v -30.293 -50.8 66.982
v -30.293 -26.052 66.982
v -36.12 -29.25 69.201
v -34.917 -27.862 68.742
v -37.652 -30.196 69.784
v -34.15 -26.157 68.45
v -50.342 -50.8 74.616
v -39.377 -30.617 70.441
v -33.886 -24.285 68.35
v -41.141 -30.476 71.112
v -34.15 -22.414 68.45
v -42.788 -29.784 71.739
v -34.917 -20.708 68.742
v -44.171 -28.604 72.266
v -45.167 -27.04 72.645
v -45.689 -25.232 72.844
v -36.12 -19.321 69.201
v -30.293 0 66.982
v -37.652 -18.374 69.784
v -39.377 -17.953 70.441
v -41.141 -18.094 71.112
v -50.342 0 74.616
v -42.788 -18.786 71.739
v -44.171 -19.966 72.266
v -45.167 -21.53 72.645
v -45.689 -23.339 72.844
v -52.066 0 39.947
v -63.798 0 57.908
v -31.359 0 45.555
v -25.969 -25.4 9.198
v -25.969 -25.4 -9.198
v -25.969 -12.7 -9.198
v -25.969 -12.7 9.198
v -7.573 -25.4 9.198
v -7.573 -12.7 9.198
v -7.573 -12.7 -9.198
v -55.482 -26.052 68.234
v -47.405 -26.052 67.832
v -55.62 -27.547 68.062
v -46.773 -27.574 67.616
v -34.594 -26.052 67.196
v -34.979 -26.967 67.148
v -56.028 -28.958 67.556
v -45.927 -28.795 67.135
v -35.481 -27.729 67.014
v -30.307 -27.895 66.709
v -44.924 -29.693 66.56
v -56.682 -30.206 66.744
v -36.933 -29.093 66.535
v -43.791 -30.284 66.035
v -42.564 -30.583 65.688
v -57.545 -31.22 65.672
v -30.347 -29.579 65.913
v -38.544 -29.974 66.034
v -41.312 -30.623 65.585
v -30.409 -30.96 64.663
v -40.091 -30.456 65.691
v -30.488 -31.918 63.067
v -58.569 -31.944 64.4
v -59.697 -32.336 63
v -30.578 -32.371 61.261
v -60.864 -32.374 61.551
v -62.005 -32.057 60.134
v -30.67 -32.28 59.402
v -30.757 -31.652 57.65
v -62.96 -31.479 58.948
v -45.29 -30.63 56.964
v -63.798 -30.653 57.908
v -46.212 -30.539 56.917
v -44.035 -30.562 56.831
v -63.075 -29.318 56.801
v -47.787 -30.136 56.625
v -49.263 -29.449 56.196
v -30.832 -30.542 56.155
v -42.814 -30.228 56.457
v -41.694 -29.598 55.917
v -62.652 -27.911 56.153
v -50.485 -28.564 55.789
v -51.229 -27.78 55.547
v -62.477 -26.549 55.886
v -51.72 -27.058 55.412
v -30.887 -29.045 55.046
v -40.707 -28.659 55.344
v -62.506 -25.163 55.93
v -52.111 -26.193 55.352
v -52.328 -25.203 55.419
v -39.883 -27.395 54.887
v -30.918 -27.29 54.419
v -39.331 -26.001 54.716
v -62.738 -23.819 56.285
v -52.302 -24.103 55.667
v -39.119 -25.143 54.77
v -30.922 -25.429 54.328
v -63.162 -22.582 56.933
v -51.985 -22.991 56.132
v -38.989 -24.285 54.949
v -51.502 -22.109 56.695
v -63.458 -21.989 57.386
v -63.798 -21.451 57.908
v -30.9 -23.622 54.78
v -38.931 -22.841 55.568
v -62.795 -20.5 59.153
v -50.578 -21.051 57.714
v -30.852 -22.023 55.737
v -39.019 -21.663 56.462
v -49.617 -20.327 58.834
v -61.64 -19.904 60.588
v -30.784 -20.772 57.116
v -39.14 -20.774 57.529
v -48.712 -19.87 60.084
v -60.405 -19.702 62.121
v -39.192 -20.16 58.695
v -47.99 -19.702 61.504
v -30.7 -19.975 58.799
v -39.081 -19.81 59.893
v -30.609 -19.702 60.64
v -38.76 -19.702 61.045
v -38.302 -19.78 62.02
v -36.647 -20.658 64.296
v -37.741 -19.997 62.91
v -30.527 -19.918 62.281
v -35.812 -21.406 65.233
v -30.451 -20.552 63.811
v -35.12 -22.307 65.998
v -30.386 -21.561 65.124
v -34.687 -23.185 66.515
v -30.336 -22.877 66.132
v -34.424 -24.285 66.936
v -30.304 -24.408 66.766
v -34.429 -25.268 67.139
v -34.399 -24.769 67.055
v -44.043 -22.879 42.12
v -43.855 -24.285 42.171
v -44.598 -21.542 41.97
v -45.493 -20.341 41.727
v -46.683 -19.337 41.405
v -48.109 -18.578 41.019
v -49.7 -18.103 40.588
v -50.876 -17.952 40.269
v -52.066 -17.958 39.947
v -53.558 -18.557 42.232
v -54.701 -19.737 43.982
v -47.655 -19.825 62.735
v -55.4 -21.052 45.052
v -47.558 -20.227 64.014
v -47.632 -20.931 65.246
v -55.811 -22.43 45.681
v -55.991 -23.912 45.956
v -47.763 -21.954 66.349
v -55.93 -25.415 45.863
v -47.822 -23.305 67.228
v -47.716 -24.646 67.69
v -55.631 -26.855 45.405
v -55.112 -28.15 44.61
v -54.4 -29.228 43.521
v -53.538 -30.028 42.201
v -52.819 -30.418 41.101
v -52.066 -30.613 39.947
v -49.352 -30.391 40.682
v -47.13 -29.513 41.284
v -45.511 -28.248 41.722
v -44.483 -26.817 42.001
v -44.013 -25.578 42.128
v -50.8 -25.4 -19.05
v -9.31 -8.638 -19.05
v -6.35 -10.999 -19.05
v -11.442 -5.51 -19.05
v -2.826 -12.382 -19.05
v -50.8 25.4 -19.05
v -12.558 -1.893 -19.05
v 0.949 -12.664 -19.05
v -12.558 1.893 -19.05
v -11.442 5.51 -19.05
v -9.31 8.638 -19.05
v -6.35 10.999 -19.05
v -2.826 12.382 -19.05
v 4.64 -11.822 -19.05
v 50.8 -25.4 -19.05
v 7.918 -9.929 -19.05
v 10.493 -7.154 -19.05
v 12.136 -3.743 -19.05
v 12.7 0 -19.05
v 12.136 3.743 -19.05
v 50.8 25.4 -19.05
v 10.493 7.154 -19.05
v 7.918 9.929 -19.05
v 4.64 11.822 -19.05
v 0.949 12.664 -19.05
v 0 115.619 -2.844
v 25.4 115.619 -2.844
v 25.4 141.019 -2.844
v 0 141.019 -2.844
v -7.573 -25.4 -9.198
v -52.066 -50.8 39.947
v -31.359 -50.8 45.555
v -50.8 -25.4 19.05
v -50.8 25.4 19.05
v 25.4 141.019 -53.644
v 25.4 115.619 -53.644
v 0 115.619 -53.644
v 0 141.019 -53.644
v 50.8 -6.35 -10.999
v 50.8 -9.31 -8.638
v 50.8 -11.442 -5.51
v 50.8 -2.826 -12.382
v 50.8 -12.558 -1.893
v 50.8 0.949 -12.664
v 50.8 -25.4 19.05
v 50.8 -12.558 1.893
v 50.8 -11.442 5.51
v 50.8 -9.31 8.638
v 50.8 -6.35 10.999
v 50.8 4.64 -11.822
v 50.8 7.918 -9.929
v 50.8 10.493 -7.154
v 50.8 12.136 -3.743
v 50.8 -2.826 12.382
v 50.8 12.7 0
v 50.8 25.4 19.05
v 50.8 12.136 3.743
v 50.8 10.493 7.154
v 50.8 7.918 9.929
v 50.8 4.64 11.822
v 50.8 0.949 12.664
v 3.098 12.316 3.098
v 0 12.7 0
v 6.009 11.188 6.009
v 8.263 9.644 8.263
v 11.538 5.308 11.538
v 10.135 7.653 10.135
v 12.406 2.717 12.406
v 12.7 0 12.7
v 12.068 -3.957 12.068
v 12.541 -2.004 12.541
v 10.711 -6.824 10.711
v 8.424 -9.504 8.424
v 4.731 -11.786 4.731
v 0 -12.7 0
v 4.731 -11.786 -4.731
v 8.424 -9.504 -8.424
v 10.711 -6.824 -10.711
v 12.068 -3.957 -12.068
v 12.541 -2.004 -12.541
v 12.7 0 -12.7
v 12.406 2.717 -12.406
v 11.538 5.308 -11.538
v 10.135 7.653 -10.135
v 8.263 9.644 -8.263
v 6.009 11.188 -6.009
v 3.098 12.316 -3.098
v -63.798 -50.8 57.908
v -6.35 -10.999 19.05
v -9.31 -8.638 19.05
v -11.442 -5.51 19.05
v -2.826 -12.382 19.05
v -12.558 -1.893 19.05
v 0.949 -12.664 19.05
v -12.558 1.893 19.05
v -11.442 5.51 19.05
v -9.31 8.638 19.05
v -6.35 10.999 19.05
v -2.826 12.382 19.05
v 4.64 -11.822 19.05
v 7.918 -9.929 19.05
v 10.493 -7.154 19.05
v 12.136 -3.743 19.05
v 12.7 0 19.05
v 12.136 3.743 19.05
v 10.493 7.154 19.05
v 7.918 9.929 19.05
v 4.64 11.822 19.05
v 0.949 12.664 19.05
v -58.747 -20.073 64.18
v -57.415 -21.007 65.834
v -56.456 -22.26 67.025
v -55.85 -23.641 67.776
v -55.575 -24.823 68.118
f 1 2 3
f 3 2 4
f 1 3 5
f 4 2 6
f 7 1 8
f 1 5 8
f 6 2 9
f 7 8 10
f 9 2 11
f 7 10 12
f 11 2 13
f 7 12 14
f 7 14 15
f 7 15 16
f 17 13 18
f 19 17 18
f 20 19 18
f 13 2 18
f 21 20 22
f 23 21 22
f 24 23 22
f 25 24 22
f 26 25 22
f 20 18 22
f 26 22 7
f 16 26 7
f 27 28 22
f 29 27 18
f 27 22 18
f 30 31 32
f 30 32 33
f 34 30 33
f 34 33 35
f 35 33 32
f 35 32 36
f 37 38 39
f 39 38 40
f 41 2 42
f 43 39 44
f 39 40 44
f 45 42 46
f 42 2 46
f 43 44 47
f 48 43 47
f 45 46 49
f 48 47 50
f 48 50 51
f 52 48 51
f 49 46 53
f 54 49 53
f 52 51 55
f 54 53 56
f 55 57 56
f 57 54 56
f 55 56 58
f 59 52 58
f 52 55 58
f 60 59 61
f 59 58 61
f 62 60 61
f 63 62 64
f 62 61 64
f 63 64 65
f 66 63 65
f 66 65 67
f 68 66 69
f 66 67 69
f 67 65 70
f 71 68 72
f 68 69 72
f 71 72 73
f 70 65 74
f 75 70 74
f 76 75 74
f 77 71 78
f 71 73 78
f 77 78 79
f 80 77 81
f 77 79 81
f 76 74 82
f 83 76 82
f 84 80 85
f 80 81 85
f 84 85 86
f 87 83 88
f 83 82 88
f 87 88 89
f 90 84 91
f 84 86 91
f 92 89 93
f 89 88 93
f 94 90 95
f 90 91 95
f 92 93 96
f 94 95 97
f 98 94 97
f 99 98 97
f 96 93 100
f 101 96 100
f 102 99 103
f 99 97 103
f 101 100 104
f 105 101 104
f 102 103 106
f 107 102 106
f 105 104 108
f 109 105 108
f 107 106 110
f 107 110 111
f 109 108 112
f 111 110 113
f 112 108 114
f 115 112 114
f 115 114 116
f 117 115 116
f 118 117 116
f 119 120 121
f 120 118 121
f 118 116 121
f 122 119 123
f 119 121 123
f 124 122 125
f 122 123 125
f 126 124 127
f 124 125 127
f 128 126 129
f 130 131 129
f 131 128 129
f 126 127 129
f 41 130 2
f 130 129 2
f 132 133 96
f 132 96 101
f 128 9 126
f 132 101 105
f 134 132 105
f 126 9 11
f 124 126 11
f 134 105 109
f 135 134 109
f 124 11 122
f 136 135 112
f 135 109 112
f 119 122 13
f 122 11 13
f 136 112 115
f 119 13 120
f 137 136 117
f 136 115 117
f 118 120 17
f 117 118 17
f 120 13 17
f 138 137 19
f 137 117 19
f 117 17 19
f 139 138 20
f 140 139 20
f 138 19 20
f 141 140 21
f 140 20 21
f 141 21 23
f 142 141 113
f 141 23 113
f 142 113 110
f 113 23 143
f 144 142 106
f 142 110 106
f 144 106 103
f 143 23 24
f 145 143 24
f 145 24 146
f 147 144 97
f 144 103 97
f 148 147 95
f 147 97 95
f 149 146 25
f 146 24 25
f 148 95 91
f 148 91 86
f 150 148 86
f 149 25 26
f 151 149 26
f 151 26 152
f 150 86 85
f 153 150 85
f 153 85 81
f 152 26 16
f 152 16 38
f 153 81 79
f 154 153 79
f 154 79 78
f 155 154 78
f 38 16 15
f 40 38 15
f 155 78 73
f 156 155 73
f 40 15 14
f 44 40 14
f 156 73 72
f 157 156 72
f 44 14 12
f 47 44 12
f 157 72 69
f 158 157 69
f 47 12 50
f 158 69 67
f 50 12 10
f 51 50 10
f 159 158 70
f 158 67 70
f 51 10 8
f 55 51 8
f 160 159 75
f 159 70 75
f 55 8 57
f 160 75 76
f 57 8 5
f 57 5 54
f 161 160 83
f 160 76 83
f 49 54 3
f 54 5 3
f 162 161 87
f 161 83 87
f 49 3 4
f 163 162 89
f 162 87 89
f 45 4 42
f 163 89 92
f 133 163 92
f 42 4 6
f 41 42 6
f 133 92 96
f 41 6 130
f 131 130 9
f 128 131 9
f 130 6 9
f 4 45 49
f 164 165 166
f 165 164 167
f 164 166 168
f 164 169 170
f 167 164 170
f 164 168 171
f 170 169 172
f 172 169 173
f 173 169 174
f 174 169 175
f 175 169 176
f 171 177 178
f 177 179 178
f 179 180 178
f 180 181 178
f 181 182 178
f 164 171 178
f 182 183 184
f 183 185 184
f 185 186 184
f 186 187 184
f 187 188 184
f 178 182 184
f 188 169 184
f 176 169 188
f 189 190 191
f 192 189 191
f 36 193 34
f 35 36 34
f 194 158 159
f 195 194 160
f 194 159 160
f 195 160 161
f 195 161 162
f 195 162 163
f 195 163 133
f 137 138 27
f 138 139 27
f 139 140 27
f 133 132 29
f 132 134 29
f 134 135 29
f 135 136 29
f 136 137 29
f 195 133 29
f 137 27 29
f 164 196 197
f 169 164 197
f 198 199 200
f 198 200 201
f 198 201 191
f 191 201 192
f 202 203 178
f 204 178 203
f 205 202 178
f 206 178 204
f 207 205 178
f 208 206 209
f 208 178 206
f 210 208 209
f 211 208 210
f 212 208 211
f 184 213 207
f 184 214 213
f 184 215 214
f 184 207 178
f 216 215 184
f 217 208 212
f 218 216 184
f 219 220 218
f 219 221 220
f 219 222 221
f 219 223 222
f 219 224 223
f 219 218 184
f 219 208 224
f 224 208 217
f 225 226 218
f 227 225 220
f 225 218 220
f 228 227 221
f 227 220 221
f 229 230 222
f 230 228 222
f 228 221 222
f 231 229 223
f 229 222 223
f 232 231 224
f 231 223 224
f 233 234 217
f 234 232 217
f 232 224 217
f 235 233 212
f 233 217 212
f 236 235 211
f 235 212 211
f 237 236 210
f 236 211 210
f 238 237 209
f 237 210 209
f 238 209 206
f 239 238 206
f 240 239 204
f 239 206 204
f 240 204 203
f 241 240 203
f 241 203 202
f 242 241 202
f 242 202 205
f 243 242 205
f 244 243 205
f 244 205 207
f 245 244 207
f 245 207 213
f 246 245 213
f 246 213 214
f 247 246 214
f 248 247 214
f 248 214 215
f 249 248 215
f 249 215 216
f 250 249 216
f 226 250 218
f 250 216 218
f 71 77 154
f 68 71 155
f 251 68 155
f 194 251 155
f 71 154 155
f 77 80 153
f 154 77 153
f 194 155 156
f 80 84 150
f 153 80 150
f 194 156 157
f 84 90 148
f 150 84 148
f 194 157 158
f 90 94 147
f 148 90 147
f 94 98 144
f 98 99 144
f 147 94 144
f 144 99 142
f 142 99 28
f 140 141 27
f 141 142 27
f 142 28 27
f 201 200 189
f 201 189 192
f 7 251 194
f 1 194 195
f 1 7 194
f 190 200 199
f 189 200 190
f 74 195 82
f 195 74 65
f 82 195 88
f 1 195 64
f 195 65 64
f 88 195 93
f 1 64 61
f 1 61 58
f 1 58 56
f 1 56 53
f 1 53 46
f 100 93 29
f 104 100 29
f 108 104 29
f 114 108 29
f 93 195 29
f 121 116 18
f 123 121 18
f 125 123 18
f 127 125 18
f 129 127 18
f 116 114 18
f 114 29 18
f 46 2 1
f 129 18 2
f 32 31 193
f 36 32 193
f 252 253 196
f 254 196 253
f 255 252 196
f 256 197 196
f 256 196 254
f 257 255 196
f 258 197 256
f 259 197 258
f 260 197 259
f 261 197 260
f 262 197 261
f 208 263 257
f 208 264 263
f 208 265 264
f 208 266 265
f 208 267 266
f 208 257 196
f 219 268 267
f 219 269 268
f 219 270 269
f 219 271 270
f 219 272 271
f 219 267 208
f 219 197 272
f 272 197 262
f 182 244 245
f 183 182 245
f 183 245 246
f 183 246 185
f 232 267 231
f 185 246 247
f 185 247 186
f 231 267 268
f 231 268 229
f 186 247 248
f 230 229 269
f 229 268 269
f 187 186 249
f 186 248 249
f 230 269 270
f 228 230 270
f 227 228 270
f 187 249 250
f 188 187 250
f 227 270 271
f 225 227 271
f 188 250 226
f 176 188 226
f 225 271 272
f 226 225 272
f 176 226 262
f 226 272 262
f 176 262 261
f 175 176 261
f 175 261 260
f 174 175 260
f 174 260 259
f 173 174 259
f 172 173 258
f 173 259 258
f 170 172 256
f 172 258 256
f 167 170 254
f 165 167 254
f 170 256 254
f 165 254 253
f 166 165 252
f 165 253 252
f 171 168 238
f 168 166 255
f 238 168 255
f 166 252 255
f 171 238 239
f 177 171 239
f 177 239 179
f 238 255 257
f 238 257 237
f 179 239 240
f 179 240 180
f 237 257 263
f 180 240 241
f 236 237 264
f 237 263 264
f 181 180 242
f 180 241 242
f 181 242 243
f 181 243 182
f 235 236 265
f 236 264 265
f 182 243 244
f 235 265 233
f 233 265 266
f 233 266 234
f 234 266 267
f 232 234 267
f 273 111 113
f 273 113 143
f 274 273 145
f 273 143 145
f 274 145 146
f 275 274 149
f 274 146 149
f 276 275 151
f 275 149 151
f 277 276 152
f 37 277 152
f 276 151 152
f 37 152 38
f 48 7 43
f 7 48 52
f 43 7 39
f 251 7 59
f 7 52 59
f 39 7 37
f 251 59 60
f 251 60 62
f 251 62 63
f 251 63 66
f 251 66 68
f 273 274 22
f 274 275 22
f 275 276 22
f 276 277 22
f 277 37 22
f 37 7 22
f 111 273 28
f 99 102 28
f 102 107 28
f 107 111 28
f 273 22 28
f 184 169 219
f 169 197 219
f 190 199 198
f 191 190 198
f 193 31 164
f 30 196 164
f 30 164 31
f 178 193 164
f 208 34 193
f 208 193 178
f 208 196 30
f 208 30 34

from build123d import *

# Parameters (mm, degrees)
F0_W      = 101.6
F0_H      = 50.8
F1_DEPTH  = 19.05
F2_R      = 12.7
F3_DEPTH  = 38.101
F4_R      = 12.7
F5_DEPTH  = 50.8
F7_DEPTH  = 50.8
F8_R      = 6.35
F9_DEPTH  = 92.3240785944
F11_DEPTH = 33.8433961016
F12_W     = 18.3963073453
F12_H     = 18.3963073453
F13_DEPTH = 12.7
F14_W     = 25.4
F14_H     = 50.8
F15_DEPTH = 25.4


with BuildPart() as f1:
    # F0 (on Top) → F1 (new body, symmetric)
    with BuildSketch(Plane.XY):
        Rectangle(F0_W, F0_H)
    extrude(amount=F1_DEPTH, both=True)

    # F2 (on face) → F3 (cut, through all)
    with BuildSketch(Plane.XY.offset(19.05)):
        Circle(F2_R)
    extrude(amount=-F3_DEPTH, mode=Mode.SUBTRACT)

    # F4 (on face) → F5 (cut)
    with BuildSketch(Plane.YZ.offset(50.8)):
        Circle(F4_R)
    extrude(amount=-F5_DEPTH, mode=Mode.SUBTRACT)

    # F12 (on face) → F13 (cut)
    with BuildSketch(Plane.XZ.offset(25.4)):
        with Locations((-16.7708438105, 0)):
            Rectangle(F12_W, F12_H)
    extrude(amount=-F13_DEPTH, mode=Mode.SUBTRACT)


with BuildPart() as f7:
    # F6 (on Front) → F7 (new body)
    with BuildSketch(Plane.XZ):
        Polygon((-52.0655937411, 39.9470913544), (-31.3585646532, 45.5552425847), (-30.293409534, 66.981811569), (-50.3421365549, 74.6160082333), (-63.7980864042, 57.9076322644), align=None)
    extrude(amount=F7_DEPTH)

    # F8 (on face) → F9 (cut, through all)
    with BuildSketch(Plane(origin=(18.4394534552, 0, 48.4252089633), x_dir=(0.9345406599, 0, -0.3558563684), z_dir=(0.3558563684, 0, 0.9345406599))):
        with Locations((-62.3406842351, -24.285223335)):
            Circle(F8_R)
    extrude(amount=-F9_DEPTH, mode=Mode.SUBTRACT)

    # F10 (on face) → F11 (cut, through all)
    with BuildSketch(Plane(origin=(-33.5403143827, 0, 1.6673522295), x_dir=(0, 1, 0), z_dir=(0.9987666498, 0, -0.0496505722))):
        with BuildLine():
            ThreePointArc((-26.0515995324, 65.3951144193), (-30.5417275929, 54.5549863587), (-19.7015995324, 59.0451144193))
            ThreePointArc((-19.7015995324, 59.0451144193), (-21.5614714718, 63.5352424798), (-26.0515995324, 65.3951144193))
        make_face()
    extrude(amount=-F11_DEPTH, mode=Mode.SUBTRACT)


with BuildPart() as f15:
    # F14 (on Right) → F15 (new body)
    with BuildSketch(Plane.YZ):
        with Locations((128.3194981515, -28.2437220309)):
            Rectangle(F14_W, F14_H)
    extrude(amount=F15_DEPTH)


solid = Compound([f1.part, f7.part, f15.part])
